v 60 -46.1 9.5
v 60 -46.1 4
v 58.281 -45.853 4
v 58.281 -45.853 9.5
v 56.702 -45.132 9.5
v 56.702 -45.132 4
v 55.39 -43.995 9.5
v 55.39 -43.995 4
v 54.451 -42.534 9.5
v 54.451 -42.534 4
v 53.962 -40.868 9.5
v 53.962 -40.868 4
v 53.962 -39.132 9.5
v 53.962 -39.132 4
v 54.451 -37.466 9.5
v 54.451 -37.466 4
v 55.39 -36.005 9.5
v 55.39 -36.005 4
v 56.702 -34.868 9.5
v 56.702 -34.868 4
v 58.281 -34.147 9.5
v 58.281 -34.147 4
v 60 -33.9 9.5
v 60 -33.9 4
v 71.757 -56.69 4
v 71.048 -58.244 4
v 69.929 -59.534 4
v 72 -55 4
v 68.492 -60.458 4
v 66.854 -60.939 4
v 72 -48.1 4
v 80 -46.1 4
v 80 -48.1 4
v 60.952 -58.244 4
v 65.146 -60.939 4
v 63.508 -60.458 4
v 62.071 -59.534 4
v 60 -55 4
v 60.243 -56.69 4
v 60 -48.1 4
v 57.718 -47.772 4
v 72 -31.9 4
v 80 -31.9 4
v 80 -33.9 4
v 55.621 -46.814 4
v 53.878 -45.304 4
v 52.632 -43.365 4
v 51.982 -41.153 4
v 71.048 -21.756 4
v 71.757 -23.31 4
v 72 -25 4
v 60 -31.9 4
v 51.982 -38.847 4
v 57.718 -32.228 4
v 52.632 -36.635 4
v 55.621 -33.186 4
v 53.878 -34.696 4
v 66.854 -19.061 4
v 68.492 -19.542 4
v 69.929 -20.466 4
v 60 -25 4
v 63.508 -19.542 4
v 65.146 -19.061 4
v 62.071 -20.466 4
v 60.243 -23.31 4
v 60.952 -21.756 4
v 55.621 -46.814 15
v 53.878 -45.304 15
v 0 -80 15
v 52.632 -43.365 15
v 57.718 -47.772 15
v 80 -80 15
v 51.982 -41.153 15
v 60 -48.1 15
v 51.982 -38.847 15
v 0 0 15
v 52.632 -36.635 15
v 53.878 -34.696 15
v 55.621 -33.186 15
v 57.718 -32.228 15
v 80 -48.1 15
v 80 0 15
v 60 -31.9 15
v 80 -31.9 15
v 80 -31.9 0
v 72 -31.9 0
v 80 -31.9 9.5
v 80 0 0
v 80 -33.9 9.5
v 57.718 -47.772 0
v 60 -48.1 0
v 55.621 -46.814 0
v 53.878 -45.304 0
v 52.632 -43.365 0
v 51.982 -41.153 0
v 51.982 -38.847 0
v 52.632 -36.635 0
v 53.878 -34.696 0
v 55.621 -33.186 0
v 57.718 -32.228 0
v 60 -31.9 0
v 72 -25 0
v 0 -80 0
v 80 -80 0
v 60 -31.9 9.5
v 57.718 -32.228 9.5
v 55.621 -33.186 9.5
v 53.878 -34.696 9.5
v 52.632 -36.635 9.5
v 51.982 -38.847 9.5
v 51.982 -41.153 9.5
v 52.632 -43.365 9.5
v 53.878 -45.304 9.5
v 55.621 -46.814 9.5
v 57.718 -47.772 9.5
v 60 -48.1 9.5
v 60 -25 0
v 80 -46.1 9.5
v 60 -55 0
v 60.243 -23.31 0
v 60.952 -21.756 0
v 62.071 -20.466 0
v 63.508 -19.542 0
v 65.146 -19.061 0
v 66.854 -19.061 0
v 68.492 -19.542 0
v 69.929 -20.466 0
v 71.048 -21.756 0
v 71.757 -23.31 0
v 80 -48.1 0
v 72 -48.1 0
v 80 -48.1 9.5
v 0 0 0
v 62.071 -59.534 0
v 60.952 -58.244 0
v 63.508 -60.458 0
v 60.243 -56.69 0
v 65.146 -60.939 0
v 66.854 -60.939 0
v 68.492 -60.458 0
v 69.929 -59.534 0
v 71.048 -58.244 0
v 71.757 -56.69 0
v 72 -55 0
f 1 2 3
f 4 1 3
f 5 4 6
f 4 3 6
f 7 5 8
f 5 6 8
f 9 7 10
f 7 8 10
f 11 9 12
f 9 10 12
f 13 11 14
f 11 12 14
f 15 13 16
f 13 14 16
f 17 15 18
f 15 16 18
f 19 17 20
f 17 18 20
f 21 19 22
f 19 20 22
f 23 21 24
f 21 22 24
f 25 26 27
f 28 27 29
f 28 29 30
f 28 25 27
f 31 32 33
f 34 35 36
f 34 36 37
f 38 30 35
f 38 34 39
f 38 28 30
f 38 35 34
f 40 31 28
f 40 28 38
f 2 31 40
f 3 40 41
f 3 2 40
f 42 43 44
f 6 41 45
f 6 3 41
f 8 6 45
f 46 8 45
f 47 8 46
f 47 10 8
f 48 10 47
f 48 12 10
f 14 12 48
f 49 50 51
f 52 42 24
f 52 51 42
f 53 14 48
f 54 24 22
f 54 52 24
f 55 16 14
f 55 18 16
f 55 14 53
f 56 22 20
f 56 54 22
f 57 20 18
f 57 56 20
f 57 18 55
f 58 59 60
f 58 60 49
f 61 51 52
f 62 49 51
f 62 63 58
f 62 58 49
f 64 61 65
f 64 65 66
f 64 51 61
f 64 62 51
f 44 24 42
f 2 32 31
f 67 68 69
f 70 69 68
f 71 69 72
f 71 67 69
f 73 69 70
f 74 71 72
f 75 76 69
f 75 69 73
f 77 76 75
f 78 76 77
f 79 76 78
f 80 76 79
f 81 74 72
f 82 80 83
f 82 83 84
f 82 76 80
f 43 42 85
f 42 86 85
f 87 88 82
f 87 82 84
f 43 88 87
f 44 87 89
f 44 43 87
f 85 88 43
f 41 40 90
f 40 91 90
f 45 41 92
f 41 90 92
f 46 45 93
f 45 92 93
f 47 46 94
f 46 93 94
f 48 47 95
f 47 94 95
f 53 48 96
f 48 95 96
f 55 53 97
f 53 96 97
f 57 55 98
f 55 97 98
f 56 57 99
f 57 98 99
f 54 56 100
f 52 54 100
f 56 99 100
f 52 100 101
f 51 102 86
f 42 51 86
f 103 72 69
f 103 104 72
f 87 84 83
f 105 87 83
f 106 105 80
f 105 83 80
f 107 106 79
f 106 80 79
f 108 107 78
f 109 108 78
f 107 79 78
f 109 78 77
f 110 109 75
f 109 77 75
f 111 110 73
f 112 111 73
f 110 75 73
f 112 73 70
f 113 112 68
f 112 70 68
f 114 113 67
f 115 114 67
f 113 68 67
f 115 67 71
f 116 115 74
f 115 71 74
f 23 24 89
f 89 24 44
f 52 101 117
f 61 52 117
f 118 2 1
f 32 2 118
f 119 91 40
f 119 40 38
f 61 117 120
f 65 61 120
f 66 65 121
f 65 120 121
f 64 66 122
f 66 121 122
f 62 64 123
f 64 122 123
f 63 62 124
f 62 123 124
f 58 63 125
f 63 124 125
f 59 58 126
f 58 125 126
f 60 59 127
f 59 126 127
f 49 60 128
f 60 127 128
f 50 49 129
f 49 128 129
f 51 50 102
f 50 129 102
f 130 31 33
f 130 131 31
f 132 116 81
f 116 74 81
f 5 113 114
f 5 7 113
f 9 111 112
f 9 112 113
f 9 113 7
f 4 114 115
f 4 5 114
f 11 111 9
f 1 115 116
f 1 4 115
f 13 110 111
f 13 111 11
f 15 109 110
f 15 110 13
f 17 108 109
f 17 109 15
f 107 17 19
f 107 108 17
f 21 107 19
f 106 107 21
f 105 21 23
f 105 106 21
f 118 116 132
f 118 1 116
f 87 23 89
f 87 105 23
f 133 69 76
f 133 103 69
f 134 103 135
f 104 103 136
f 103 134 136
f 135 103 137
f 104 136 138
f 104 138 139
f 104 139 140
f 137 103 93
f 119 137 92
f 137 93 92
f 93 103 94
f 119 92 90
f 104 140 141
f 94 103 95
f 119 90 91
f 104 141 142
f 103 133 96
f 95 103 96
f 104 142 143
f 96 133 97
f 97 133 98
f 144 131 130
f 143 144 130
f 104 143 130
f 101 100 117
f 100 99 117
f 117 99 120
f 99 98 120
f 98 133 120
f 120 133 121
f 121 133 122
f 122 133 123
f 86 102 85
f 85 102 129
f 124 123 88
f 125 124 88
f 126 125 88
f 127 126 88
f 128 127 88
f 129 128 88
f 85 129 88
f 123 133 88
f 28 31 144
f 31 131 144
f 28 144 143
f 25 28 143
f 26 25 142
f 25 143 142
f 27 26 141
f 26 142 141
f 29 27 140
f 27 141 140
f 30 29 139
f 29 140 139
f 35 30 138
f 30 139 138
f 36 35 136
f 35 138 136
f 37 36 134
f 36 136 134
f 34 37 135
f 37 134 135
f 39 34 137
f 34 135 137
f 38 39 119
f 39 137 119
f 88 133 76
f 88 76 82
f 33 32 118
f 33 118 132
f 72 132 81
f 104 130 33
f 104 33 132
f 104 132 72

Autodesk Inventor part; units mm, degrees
ref_plane "YZ Plane" through (0, 0, 0) normal (1, 0, 0) x (0, 1, 0)
ref_plane "XZ Plane" through (0, 0, 0) normal (0, 1, 0) x (-1, 0, 0)
ref_plane "XY Plane" through (0, 0, 0) normal (0, 0, 1) x (1, 0, 0)
sketch "Sketch1" plane through (0, 0, 0) normal (0, 0, 1) x (1, 0, 0)
  line L0 (0, 0) -> (80, 0)
  line L1 (80, 0) -> (80, -80)
  line L2 (80, -80) -> (0, -80)
  line L3 (0, -80) -> (0, 0)
  dimension "d0" = 80
  dimension "d1" = 80
extrude "Extrusion1" add sketch "Sketch1" along normal blind 15
sketch "Sketch2" plane through (0, 0, 0) normal (0, 0, -1) x (-1, 0, 0)
  line L0 (0, 0) -> (-80, 0) projected
  circle A0 centre (-60, -40) radius 6.1
  line L1 (-80, 0) -> (-80, -80) projected
  line L2 (-60, -33.9) -> (-80, -33.9)
  line L3 (-80, -80) -> (-80, 0) projected
  line L4 (-60, -46.1) -> (-80, -46.1)
  line L5 (-80, -46.1) -> (-80, -33.9)
  dimension "d7" = 40
  dimension "d8" = 20
  dimension "d9" = 12.2
extrude "Extrusion2" cut sketch "Sketch2" against normal through all
sketch "Sketch3" plane through (0, 0, 0) normal (0, 0, -1) x (-1, 0, 0)
  arc A0 (-60, -46.1) -> (-60, -33.9) centre (-60, -40) ccw projected
  circle A1 centre (-60, -40) radius 8.1
  line L0 (-60, -31.9) -> (-80, -31.9)
  line L1 (-80, -33.9) -> (-80, 0) projected
  line L2 (-60, -48.1) -> (-80, -48.1)
  line L3 (-80, -48.1) -> (-80, -31.9)
  point P0 (0, 0)
  dimension "d12" = 16.2
extrude "Extrusion3" cut sketch "Sketch3" against normal blind 4
sketch "Sketch4" plane through (0, 0, 15) normal (0, 0, 1) x (1, 0, 0)
  line L0 (80, -31.9) -> (60, -31.9) projected
  arc A0 (60, -31.9) -> (60, -48.1) centre (60, -40) ccw projected
  line L1 (60, -48.1) -> (80, -48.1) projected
  line L2 (80, -46.1) -> (60, -46.1) projected
  arc A1 (60, -33.9) -> (60, -46.1) centre (60, -40) ccw projected
  line L3 (60, -33.9) -> (80, -33.9) projected
  line L4 (80, -33.9) -> (80, -31.9)
  line L5 (80, -33.9) -> (80, 0) projected
  line L6 (80, -46.1) -> (80, -48.1)
  line L7 (80, -80) -> (80, -46.1) projected
  point P0 (0, 0)
extrude "Extrusion4" cut sketch "Sketch4" against normal blind 5.5
sketch "Sketch5" plane through (0, 0, 0) normal (0, 0, -1) x (-1, 0, 0)
  arc A0 (-60, -46.1) -> (-60, -33.9) centre (-60, -40) ccw projected
  line L0 (-80, -31.9) -> (-60, -31.9) projected
  circle A1 centre (-60, -40) radius 8.1
  line L1 (-60, -31.9) -> (-60, -25)
  line L2 (-72, -25) -> (-72, -55)
  line L3 (-60, -48.1) -> (-60, -55)
  arc A2 (-60, -48.1) -> (-60, -31.9) centre (-60, -40) ccw projected
  line L4 (-60, -31.9) -> (-60, -31.9)
  line L5 (-60, -31.9) -> (-60, -31.9)
  line L6 (-60, -33.9) -> (-60, -46.1)
  arc A3 (-60, -25) -> (-72, -25) centre (-66, -25) ccw
  arc A4 (-72, -55) -> (-60, -55) centre (-66, -55) ccw
  point P0 (0, 0)
  dimension "d17" = 12
  dimension "d20" = 30
  dimension "d21" = 15
extrude "Extrusion5" cut sketch "Sketch5" against normal blind 4 contours L2 A3 L1 L0 | L0 A1 L3 A4 L2
equation "\"RodDiameter\" = 8"
equation "\"VerticalBearingOD\" = 16"
equation "\"PrintingClearance\" = 0.2"
properties part number "HotendMountCarriage"
